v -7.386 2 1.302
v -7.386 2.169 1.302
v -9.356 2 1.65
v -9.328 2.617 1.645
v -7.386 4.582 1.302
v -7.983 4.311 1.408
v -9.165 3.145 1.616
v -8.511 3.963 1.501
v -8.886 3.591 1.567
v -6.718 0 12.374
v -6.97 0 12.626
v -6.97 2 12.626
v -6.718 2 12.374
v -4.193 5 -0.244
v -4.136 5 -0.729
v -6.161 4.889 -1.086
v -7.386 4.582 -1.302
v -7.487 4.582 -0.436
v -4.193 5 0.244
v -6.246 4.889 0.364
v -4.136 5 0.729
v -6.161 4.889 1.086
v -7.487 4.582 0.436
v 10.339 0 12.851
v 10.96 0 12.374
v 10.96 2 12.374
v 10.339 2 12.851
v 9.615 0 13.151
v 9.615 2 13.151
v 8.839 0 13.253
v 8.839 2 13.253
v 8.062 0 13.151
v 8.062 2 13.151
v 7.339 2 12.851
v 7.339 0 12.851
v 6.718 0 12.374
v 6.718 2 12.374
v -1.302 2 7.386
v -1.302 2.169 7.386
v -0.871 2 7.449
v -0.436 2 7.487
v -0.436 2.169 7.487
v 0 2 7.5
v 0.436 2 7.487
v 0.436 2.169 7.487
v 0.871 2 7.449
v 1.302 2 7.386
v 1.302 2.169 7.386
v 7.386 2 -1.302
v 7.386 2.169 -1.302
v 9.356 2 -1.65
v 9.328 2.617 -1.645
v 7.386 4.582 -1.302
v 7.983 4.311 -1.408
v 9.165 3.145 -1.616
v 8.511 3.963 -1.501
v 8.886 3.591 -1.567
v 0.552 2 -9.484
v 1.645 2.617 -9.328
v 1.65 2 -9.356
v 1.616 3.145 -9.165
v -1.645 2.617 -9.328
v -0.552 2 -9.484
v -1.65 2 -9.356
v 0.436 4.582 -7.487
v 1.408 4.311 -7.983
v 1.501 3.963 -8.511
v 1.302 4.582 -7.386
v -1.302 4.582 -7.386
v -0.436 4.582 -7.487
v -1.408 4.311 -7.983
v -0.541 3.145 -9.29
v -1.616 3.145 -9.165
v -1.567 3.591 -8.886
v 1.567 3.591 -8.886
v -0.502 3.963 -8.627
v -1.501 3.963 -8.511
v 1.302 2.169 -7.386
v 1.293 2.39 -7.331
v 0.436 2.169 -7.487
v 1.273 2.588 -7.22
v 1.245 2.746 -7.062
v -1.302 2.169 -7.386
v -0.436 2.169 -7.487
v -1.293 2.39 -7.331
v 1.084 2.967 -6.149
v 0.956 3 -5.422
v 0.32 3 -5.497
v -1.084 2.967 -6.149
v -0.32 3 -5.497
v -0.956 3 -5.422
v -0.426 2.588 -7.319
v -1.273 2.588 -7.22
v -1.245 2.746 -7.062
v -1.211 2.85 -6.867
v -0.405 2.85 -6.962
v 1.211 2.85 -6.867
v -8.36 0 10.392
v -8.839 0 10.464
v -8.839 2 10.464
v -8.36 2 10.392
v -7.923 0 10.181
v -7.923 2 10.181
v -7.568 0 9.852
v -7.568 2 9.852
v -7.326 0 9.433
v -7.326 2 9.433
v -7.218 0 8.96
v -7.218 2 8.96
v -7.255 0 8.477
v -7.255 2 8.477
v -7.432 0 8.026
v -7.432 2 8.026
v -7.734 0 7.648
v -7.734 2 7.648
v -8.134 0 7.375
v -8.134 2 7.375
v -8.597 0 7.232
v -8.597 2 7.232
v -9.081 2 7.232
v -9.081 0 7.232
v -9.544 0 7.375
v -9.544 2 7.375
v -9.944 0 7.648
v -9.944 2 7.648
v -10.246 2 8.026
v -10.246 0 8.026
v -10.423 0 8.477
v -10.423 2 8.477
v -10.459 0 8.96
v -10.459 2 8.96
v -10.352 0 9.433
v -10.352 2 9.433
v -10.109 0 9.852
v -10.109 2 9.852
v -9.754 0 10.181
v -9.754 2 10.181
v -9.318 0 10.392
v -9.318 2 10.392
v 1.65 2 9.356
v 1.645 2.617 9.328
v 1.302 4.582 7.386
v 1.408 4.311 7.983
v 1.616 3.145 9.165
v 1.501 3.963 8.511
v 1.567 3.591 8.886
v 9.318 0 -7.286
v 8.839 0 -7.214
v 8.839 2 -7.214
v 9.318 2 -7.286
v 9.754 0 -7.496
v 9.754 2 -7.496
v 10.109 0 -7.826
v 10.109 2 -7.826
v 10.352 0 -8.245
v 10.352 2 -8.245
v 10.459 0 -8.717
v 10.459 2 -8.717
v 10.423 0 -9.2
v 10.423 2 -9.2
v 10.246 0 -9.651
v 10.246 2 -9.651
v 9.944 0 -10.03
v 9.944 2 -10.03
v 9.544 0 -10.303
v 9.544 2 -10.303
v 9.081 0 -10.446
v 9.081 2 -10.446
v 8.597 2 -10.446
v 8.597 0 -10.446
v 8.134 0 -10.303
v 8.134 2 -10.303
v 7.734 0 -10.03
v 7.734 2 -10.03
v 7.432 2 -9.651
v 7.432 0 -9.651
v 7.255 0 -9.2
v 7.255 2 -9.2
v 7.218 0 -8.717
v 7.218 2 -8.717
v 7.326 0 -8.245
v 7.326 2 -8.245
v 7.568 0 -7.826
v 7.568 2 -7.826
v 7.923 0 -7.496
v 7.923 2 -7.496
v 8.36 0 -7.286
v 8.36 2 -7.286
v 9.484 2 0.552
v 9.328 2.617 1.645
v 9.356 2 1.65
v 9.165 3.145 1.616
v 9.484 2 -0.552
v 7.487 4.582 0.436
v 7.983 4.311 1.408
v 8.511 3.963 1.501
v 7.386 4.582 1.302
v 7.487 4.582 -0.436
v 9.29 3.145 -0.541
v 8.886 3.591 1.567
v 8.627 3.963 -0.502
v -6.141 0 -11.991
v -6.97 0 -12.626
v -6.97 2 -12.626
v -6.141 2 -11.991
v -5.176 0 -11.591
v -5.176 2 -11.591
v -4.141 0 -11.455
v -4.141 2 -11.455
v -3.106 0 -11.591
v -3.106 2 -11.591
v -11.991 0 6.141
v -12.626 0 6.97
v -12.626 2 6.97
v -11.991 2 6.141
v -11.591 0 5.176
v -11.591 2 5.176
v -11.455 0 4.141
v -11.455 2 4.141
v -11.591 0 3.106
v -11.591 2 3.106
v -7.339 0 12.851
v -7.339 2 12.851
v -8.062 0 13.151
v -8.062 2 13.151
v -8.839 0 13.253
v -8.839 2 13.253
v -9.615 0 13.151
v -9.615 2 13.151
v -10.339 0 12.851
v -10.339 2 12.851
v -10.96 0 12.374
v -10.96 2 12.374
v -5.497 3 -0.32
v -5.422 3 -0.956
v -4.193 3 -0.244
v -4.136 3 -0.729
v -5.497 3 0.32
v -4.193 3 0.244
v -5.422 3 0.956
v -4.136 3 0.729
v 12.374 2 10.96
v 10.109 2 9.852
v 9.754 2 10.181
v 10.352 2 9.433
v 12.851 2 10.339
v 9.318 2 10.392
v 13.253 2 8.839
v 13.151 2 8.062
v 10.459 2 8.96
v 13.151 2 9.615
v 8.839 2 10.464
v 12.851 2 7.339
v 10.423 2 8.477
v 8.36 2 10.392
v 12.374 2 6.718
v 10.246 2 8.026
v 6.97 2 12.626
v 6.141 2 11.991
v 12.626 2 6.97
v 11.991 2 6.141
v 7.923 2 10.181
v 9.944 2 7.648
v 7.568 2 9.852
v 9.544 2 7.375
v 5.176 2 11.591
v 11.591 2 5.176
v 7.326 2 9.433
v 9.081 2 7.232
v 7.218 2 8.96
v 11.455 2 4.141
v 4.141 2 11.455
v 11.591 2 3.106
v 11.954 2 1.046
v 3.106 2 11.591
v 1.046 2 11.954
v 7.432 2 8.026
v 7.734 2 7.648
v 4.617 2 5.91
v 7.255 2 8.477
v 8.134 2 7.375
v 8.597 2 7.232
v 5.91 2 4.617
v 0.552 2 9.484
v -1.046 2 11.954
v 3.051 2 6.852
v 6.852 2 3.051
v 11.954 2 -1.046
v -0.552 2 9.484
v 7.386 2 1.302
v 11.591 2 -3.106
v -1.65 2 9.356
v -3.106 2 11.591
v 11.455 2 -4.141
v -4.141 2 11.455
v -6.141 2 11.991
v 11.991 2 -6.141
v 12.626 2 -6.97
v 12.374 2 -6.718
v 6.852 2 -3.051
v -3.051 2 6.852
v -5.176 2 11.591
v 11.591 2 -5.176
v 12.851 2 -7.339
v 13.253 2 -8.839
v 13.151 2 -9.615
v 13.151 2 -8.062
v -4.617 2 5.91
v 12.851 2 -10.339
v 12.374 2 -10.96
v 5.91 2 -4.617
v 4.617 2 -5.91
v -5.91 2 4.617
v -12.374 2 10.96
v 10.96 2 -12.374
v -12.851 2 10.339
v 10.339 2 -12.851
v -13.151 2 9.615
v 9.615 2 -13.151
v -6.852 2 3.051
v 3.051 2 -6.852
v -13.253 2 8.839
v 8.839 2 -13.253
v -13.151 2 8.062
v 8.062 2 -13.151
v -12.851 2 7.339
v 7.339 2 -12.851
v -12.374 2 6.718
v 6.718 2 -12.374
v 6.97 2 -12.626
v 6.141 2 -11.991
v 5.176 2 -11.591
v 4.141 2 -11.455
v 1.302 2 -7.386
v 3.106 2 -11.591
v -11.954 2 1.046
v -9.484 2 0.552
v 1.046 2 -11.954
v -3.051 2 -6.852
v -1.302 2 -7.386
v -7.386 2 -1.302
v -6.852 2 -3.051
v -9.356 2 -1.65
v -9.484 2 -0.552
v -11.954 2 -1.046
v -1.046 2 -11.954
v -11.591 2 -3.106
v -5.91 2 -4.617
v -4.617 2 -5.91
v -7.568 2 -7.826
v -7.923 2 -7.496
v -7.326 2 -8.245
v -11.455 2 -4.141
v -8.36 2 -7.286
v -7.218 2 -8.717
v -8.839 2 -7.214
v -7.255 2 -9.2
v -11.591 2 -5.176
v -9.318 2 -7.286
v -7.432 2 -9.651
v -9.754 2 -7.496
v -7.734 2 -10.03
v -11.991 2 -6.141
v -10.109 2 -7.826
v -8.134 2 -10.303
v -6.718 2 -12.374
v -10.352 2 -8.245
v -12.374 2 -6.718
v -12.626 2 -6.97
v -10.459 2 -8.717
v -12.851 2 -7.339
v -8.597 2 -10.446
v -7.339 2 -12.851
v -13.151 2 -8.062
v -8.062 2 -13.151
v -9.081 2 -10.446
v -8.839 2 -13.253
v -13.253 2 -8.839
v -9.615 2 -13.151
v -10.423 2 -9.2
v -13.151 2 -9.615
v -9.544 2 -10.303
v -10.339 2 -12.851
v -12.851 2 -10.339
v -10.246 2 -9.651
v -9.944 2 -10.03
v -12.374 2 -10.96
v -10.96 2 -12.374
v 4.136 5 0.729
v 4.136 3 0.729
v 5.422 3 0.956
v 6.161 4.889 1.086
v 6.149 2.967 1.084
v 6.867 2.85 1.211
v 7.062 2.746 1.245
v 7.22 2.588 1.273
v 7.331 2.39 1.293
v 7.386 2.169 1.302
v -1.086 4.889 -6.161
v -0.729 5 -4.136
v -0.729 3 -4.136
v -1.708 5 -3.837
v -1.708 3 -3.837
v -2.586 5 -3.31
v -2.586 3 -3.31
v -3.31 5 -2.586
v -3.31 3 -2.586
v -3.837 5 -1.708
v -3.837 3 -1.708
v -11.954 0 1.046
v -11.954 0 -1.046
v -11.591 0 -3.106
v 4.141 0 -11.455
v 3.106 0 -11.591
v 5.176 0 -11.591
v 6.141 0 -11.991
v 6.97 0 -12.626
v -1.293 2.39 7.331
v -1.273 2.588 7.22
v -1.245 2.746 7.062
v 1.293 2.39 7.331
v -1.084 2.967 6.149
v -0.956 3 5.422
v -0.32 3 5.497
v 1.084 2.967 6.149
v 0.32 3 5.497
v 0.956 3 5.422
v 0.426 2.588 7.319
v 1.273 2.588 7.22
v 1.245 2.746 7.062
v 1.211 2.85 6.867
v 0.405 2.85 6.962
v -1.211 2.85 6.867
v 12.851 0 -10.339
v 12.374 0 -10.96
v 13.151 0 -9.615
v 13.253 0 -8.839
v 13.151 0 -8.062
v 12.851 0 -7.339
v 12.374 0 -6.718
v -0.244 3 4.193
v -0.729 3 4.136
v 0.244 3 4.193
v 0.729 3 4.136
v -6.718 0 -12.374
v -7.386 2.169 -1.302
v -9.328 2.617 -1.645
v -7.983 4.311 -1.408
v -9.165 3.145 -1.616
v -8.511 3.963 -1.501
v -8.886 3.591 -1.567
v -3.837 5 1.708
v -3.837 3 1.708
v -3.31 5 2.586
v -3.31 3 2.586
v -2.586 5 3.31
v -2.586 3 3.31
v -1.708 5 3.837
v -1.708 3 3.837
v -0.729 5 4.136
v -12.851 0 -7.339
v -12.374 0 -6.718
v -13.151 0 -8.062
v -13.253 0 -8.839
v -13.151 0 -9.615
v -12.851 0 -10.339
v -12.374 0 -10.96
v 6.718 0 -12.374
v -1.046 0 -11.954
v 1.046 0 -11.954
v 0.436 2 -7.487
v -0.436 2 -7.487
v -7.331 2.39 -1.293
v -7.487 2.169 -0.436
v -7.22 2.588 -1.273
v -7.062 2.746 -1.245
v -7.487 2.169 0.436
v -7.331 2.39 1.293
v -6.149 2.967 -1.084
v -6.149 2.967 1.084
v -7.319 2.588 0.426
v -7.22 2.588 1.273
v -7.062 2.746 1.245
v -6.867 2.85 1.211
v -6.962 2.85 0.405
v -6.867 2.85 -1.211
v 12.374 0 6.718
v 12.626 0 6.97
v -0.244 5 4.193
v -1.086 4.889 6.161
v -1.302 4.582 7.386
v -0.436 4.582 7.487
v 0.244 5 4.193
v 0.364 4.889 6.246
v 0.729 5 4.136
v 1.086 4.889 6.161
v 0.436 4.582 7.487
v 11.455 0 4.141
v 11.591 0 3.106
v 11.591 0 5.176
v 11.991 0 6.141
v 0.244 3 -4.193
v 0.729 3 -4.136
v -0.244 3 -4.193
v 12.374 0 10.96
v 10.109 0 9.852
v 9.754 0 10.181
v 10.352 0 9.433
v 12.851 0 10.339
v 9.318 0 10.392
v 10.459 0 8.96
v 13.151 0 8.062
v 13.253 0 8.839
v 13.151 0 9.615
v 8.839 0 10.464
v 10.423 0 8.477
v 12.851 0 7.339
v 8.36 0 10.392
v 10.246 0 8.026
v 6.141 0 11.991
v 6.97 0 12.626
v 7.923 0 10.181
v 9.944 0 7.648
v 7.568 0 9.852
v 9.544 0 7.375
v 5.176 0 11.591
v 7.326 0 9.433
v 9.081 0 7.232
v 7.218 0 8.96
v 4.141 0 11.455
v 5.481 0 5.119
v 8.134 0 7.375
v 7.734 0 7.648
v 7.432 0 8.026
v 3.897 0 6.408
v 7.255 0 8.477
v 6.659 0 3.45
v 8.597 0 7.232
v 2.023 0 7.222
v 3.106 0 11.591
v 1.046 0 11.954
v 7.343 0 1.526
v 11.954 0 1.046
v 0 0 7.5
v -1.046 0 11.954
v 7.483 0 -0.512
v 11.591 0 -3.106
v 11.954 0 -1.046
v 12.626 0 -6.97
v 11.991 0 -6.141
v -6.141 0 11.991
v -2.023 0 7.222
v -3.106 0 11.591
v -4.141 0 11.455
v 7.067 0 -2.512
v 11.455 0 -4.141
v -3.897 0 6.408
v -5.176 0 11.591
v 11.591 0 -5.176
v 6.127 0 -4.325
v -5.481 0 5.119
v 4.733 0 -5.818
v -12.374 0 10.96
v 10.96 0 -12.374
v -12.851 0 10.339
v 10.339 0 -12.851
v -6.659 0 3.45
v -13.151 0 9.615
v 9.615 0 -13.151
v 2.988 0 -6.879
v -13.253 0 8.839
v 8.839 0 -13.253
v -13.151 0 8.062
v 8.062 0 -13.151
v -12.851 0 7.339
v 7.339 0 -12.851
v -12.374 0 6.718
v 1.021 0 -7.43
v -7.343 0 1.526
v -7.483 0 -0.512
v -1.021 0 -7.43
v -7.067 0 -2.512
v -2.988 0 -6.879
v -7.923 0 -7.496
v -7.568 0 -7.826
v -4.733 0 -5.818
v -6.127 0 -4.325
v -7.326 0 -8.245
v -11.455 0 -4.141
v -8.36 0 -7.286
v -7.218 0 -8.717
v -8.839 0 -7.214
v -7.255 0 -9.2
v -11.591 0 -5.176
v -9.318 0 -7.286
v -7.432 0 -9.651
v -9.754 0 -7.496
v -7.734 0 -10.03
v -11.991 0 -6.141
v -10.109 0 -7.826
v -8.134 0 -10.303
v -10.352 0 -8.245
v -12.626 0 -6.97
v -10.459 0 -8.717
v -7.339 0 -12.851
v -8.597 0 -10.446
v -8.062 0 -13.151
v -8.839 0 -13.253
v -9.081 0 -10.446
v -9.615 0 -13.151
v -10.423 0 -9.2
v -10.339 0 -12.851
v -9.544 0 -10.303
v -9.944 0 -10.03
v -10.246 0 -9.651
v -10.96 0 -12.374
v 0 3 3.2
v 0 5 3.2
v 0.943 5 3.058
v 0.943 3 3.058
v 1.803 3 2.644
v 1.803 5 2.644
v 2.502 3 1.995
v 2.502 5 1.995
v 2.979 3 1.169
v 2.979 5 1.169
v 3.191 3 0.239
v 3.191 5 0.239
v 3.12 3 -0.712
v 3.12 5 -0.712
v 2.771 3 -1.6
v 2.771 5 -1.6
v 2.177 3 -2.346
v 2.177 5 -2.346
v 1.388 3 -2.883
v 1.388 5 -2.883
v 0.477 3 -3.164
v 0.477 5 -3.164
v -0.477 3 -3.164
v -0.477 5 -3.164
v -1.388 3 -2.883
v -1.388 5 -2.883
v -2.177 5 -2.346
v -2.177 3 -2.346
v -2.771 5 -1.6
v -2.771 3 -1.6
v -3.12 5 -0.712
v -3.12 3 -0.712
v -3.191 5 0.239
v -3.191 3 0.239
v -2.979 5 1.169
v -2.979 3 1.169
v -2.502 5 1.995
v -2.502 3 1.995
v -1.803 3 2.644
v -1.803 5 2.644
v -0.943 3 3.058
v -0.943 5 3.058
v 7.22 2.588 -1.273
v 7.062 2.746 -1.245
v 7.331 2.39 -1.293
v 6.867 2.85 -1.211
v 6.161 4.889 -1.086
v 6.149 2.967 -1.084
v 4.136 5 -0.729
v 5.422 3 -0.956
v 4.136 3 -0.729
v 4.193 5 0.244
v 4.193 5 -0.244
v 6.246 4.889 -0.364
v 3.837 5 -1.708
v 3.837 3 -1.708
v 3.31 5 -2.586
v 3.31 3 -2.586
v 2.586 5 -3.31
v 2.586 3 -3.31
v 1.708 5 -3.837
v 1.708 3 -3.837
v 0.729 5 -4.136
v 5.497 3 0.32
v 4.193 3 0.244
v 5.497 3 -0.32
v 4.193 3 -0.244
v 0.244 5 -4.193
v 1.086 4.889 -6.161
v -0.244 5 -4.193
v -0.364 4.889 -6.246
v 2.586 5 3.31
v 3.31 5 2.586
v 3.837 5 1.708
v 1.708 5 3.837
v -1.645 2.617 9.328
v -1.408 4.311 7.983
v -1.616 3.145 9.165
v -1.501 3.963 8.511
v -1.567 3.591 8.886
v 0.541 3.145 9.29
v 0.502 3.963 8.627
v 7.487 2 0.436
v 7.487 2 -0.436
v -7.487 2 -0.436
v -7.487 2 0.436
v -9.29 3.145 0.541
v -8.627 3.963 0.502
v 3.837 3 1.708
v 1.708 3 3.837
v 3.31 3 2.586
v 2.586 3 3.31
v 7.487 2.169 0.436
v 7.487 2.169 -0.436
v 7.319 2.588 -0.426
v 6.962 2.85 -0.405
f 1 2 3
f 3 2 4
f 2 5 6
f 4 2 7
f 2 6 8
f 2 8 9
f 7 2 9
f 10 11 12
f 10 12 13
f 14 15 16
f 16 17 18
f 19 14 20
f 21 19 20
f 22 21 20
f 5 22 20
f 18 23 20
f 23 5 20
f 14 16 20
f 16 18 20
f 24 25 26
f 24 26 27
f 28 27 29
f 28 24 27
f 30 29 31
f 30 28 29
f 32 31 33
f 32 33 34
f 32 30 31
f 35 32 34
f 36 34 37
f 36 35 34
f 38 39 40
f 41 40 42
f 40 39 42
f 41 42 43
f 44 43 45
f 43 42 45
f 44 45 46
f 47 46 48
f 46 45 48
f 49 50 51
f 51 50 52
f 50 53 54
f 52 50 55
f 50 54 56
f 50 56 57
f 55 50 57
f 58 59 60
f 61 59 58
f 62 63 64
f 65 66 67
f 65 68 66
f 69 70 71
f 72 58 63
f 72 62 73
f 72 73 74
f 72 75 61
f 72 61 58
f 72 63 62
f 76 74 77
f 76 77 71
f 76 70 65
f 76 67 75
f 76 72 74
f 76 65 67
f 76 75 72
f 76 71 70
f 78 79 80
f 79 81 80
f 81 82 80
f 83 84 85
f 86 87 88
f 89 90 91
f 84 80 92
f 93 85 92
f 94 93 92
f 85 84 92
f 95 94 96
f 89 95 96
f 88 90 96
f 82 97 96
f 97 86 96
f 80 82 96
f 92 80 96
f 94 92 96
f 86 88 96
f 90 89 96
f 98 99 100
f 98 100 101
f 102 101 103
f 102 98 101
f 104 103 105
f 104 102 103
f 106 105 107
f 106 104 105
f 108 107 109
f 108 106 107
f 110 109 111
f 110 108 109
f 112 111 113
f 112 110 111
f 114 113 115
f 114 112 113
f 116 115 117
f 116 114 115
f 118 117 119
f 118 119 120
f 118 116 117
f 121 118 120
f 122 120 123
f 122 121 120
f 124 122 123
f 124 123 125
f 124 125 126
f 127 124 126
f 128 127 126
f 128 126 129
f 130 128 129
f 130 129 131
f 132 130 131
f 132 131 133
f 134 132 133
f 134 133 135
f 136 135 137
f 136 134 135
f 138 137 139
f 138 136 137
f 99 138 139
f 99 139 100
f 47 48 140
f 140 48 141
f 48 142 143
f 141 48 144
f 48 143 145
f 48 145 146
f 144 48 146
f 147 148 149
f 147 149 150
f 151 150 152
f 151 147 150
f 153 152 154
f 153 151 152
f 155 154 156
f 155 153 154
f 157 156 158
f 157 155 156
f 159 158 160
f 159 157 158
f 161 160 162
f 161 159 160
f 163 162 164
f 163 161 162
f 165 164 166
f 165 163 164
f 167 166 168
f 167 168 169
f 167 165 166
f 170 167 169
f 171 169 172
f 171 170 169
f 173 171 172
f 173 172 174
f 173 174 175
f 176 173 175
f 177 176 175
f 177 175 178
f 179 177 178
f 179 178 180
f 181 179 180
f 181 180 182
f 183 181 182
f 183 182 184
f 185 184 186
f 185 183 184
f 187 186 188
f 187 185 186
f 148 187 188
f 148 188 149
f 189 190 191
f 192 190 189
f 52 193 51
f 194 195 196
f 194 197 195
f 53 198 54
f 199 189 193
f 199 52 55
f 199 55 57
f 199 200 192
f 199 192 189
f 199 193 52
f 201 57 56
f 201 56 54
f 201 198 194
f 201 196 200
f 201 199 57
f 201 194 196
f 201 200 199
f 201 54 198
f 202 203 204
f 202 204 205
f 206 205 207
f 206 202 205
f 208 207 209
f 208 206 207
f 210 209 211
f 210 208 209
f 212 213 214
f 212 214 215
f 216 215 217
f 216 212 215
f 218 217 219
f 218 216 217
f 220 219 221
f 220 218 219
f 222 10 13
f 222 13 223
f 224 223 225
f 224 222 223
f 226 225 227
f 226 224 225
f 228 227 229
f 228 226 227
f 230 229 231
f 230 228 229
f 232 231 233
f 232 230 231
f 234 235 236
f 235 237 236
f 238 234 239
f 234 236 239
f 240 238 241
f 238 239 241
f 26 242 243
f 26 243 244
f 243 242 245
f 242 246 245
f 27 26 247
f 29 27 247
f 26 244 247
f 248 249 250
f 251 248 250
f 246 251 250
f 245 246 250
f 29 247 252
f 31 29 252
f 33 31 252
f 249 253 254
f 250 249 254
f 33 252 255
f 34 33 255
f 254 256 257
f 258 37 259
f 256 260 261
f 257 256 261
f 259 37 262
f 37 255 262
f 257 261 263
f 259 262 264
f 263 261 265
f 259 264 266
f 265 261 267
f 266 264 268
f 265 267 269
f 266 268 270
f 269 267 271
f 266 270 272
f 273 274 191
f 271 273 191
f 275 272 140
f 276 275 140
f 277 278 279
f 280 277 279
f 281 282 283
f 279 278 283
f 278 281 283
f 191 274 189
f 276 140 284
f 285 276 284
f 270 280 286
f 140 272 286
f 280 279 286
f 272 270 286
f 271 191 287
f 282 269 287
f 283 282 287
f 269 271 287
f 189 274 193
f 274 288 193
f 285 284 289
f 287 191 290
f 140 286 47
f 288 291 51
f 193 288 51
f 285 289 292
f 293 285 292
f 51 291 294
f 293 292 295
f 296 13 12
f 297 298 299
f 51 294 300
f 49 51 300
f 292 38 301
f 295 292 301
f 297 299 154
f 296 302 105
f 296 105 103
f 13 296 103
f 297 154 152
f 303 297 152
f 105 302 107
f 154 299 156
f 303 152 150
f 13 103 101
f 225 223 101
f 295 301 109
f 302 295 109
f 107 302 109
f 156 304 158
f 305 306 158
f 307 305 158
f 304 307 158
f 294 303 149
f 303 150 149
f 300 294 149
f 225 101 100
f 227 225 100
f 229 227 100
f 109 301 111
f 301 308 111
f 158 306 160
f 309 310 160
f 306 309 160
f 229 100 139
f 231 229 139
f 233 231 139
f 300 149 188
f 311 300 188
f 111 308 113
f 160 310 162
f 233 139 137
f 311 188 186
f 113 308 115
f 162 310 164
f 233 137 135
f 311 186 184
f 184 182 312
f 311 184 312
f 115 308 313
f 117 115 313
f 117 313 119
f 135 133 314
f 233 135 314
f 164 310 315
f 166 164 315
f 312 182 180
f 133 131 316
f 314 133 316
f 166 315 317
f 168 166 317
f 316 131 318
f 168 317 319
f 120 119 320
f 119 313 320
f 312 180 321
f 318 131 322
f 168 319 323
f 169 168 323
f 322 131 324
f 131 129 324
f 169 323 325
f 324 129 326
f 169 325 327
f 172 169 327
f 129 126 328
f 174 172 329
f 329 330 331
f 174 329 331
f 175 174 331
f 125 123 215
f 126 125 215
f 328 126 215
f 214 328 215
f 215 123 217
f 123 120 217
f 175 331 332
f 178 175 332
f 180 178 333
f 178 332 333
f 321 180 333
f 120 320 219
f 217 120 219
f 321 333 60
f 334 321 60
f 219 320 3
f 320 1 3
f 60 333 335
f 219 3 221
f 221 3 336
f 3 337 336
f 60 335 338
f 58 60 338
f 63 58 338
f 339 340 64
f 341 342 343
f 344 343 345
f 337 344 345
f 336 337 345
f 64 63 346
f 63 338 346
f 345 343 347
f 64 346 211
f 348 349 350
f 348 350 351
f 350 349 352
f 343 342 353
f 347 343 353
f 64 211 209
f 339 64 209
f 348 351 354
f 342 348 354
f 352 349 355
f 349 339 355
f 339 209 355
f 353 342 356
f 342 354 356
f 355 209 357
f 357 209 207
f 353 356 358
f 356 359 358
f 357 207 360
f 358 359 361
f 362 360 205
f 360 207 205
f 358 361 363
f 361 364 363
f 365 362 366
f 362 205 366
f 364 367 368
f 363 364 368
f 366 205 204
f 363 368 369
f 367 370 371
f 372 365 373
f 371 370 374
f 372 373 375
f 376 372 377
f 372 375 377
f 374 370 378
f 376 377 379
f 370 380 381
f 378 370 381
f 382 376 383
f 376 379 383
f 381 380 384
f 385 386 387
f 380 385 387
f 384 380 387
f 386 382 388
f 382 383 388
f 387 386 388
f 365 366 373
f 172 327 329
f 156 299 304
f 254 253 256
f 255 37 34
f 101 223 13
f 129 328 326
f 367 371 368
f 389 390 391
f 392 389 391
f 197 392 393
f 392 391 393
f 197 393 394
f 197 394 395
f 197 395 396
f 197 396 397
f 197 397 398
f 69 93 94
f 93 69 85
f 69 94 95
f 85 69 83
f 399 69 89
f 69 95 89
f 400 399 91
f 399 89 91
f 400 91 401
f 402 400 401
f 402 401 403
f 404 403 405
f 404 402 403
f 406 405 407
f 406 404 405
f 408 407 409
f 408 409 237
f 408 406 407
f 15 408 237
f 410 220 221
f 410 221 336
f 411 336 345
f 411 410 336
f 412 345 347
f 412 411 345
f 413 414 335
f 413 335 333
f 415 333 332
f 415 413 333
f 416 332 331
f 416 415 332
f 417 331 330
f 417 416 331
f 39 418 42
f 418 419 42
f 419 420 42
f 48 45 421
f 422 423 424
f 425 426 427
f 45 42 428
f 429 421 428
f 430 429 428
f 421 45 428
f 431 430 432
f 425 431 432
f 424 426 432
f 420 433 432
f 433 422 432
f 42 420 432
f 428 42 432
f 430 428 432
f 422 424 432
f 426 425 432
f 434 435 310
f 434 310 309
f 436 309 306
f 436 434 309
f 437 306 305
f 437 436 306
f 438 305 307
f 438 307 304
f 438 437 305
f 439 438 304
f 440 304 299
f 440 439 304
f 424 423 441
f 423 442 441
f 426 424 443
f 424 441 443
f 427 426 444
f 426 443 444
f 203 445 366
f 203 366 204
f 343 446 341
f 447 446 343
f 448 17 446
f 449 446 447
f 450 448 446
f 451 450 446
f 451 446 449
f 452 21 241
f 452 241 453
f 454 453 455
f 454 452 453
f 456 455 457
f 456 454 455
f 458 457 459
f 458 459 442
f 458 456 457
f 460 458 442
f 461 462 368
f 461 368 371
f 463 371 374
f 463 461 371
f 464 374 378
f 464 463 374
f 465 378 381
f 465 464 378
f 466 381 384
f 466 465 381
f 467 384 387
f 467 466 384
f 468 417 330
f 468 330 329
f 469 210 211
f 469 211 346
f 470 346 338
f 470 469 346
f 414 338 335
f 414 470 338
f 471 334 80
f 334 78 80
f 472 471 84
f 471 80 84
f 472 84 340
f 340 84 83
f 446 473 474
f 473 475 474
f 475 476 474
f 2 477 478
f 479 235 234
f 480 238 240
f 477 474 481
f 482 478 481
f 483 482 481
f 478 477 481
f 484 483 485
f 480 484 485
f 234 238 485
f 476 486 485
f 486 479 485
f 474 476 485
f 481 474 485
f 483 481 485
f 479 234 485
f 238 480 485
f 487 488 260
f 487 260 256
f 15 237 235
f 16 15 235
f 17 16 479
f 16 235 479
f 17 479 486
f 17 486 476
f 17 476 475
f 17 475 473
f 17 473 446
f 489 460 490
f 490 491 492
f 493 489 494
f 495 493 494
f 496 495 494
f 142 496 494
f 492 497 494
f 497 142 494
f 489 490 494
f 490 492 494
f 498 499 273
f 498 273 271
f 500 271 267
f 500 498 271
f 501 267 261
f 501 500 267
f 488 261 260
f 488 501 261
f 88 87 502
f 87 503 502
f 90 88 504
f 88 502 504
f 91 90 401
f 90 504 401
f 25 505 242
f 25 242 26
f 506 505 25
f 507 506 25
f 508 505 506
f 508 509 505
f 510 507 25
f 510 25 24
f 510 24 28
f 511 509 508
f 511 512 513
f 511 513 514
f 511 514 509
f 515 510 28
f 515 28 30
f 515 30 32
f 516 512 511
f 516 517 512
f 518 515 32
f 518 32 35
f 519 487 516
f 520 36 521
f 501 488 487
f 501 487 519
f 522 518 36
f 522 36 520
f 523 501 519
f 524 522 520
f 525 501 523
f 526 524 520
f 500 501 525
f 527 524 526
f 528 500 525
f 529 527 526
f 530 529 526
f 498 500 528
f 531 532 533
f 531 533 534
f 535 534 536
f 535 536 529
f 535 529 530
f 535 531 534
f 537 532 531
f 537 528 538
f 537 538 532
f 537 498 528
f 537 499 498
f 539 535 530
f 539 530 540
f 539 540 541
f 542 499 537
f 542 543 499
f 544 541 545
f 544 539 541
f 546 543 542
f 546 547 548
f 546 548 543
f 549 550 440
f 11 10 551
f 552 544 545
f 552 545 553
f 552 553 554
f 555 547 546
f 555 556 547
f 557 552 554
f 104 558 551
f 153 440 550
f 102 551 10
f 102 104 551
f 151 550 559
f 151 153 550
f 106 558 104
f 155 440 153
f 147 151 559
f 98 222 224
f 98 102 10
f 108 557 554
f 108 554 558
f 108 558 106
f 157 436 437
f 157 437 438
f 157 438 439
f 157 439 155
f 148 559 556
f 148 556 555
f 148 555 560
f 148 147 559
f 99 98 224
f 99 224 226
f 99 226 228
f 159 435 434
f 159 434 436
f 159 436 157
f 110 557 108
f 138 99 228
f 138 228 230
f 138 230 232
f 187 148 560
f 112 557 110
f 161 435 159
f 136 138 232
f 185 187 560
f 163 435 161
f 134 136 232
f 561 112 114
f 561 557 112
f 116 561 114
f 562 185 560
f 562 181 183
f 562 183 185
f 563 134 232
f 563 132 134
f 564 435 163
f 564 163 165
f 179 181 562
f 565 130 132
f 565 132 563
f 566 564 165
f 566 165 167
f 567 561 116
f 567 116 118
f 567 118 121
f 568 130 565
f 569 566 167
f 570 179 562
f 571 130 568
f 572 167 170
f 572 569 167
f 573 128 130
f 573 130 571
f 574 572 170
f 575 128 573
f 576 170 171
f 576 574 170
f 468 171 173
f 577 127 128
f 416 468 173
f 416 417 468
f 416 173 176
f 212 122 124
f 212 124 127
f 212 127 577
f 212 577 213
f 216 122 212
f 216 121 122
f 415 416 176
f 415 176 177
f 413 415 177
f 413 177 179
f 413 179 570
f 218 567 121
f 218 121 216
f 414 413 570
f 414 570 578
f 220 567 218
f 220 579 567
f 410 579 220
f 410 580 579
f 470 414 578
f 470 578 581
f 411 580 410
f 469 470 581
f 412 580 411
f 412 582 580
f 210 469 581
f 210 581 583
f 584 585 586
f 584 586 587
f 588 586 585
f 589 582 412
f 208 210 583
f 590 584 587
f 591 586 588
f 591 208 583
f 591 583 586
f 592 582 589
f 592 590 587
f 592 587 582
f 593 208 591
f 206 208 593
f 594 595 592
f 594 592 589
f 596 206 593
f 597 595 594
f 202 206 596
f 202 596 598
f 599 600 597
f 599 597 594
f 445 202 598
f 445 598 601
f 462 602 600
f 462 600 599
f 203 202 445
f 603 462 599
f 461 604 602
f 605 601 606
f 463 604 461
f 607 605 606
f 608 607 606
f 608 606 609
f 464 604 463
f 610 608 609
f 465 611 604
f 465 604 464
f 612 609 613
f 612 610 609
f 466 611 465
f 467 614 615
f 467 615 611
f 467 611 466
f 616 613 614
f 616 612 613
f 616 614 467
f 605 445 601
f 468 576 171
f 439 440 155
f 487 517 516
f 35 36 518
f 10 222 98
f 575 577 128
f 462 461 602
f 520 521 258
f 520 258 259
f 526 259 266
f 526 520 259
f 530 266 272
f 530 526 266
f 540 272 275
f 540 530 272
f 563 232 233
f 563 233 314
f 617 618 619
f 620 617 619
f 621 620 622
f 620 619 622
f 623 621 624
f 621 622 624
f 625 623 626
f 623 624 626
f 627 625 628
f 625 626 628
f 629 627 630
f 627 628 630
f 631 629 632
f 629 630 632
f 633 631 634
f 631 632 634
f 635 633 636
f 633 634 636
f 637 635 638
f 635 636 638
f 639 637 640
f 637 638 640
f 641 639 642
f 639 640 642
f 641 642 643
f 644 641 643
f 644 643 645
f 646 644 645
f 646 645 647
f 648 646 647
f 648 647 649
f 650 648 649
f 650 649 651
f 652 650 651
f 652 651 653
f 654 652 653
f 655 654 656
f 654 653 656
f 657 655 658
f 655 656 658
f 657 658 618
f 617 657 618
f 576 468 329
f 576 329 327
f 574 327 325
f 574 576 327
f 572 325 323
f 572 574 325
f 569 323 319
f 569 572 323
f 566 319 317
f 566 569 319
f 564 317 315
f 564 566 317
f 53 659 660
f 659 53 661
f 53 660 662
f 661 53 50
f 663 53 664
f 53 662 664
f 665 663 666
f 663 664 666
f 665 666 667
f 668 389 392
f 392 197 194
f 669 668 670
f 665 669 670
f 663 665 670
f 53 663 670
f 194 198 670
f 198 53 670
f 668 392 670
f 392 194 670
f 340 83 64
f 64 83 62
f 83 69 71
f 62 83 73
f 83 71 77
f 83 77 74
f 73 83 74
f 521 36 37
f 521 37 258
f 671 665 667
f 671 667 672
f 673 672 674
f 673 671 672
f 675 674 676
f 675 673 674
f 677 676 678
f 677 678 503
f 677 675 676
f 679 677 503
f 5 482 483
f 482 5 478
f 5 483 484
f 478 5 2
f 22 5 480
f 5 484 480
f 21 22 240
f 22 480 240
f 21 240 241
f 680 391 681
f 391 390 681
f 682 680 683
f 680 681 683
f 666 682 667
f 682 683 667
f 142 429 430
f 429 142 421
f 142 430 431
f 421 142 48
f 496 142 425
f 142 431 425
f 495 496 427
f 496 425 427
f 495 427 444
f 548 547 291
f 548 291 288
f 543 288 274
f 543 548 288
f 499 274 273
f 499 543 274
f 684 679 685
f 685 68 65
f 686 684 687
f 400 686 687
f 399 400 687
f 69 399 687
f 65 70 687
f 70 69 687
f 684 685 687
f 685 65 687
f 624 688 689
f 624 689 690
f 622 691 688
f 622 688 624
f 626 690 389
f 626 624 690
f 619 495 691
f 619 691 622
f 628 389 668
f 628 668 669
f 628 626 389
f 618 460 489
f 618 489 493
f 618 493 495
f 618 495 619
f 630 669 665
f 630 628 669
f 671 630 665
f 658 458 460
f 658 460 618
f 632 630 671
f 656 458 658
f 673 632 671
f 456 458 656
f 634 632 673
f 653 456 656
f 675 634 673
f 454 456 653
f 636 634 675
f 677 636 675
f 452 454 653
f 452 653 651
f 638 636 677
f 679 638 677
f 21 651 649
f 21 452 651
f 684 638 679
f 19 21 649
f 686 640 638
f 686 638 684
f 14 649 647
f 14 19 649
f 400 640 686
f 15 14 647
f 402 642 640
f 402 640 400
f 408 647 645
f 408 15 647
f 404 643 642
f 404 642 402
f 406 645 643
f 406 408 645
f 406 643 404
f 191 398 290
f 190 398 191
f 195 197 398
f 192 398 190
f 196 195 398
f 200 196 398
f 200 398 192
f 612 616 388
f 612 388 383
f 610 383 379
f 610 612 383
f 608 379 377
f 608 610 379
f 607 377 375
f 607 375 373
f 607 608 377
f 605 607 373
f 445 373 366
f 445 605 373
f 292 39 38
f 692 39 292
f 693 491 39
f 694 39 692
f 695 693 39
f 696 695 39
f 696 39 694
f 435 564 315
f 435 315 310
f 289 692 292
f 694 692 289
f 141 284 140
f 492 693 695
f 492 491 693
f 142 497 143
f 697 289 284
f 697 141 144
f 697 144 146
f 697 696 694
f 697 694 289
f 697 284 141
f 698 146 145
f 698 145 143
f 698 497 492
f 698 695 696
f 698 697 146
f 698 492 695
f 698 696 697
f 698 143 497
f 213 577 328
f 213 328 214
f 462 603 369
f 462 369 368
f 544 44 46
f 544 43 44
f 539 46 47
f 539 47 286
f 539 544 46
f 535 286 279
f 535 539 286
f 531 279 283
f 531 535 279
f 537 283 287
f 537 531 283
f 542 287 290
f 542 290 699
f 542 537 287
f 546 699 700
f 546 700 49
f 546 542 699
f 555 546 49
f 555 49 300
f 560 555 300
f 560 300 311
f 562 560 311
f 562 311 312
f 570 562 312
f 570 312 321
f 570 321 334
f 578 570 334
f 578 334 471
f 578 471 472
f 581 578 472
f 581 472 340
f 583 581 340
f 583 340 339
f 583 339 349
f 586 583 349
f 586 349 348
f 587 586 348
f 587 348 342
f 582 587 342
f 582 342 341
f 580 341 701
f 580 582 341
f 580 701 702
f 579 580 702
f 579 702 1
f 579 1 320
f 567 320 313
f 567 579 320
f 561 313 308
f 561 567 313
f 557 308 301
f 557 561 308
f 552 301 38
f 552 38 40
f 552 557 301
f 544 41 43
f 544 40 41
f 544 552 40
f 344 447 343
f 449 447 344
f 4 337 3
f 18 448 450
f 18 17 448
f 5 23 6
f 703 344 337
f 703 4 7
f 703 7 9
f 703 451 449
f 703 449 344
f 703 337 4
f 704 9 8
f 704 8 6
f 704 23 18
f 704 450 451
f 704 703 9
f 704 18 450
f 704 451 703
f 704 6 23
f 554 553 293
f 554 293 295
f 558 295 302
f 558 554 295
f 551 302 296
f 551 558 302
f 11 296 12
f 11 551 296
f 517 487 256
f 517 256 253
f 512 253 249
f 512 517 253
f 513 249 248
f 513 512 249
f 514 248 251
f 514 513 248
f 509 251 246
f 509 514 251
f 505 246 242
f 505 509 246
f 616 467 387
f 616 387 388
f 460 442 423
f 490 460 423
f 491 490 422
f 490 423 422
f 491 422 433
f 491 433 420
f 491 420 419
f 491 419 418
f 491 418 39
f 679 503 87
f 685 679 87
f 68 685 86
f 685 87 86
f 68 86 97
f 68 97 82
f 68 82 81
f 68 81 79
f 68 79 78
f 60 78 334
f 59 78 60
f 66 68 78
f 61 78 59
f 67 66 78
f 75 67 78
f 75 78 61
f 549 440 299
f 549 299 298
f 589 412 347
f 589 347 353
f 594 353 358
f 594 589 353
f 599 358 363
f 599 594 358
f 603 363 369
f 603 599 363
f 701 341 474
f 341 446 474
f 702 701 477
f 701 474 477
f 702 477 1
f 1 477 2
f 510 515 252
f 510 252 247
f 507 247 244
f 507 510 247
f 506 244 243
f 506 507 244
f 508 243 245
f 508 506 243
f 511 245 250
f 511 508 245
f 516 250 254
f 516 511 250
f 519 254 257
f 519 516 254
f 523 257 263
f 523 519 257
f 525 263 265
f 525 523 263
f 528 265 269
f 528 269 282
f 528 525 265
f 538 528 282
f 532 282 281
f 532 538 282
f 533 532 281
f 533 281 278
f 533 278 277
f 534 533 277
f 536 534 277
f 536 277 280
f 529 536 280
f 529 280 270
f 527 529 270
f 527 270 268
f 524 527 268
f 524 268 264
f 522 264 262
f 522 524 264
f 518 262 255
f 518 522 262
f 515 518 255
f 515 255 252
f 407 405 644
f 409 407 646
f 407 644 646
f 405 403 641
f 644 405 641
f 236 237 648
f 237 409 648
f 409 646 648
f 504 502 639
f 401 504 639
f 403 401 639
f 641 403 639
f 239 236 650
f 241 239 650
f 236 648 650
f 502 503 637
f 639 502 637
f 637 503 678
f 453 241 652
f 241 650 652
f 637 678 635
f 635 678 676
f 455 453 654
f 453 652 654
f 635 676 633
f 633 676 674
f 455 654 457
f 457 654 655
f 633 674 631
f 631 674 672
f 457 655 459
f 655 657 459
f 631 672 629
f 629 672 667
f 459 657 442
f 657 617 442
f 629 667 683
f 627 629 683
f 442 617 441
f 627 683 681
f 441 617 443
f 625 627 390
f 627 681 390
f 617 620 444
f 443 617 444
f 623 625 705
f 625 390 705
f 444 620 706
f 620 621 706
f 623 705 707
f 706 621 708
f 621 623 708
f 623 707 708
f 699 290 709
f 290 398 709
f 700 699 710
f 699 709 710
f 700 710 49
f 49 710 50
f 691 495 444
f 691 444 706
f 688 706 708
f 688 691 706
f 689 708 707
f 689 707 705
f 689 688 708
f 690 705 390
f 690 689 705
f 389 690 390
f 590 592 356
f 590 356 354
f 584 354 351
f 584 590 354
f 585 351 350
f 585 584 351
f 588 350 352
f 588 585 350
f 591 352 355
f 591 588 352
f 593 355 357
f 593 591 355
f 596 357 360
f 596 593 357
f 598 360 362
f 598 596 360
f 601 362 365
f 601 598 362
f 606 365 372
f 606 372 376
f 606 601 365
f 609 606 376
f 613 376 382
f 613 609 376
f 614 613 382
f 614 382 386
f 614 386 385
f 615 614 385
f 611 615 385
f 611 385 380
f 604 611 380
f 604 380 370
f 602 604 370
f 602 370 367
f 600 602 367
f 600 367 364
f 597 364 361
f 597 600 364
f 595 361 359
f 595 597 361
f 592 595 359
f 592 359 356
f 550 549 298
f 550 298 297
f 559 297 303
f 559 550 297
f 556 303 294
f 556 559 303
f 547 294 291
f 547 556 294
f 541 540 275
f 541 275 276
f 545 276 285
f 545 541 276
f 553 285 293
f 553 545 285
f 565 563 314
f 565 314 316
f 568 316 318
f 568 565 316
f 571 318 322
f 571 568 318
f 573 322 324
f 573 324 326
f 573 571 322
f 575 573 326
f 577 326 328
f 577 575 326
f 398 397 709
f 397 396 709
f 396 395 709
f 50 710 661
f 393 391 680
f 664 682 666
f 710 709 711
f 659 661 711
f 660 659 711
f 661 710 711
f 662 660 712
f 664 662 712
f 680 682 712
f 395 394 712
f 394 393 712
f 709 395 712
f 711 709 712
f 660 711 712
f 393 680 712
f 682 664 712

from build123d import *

# Parameters (mm, degrees)
SKETCH21_R          = 1.625
SKETCH21_R_2        = 7.5
MAIN_DEPTH          = 2
SKETCH23_R          = 4.2
SKETCH23_R_2        = 3.2
BOSS_EXTRUDE1_DEPTH = 2
REVOLVE1_START      = 2
REVOLVE1_DEPTH      = 3.0000001
REVOLVE1_2_ANGLE    = 20
REVOLVE1_3_ANGLE    = 20
CIRPATTERN1_COUNT   = 4


with BuildPart() as part:
    # Sketch21 → Main (new body)
    with BuildSketch(Plane(origin=(0, 0, 0), x_dir=(1, 0, 0), z_dir=(0, 1, 0))):
        with BuildLine():
            Line((-12.374368671, 10.960155108), (-10.960155108, 12.374368671))
            ThreePointArc((-10.960155108, 12.374368671), (-8.838834765, 13.253048327), (-6.717514421, 12.374368671))
            Line((-6.717514421, 12.374368671), (-6.969531846, 12.626386096))
            ThreePointArc((-6.969531846, 12.626386096), (-5.176380902, 11.591109915), (-3.105828541, 11.591109915))
            ThreePointArc((-3.105828541, 11.591109915), (0, 12), (3.105828541, 11.591109915))
            ThreePointArc((3.105828541, 11.591109915), (5.176380902, 11.591109915), (6.969531846, 12.626386096))
            Line((6.969531846, 12.626386096), (6.717514421, 12.374368671))
            ThreePointArc((6.717514421, 12.374368671), (8.838834765, 13.253048327), (10.960155108, 12.374368671))
            Line((10.960155108, 12.374368671), (12.374368671, 10.960155108))
            ThreePointArc((12.374368671, 10.960155108), (13.253048327, 8.838834765), (12.374368671, 6.717514421))
            Line((12.374368671, 6.717514421), (12.626386096, 6.969531846))
            ThreePointArc((12.626386096, 6.969531846), (11.591109915, 5.176380902), (11.591109915, 3.105828541))
            ThreePointArc((11.591109915, 3.105828541), (12, 0), (11.591109915, -3.105828541))
            ThreePointArc((11.591109915, -3.105828541), (11.591109915, -5.176380902), (12.626386096, -6.969531846))
            Line((12.626386096, -6.969531846), (12.374368671, -6.717514421))
            ThreePointArc((12.374368671, -6.717514421), (13.253048327, -8.838834765), (12.374368671, -10.960155108))
            Line((12.374368671, -10.960155108), (10.960155108, -12.374368671))
            ThreePointArc((10.960155108, -12.374368671), (8.838834765, -13.253048327), (6.717514421, -12.374368671))
            Line((6.717514421, -12.374368671), (6.969531846, -12.626386096))
            ThreePointArc((6.969531846, -12.626386096), (5.176380902, -11.591109915), (3.105828541, -11.591109915))
            ThreePointArc((3.105828541, -11.591109915), (0, -12), (-3.105828541, -11.591109915))
            ThreePointArc((-3.105828541, -11.591109915), (-5.176380902, -11.591109915), (-6.969531846, -12.626386096))
            Line((-6.969531846, -12.626386096), (-6.717514421, -12.374368671))
            ThreePointArc((-6.717514421, -12.374368671), (-8.838834765, -13.253048327), (-10.960155108, -12.374368671))
            Line((-10.960155108, -12.374368671), (-12.374368671, -10.960155108))
            ThreePointArc((-12.374368671, -10.960155108), (-13.253048327, -8.838834765), (-12.374368671, -6.717514421))
            Line((-12.374368671, -6.717514421), (-12.626386096, -6.969531846))
            ThreePointArc((-12.626386096, -6.969531846), (-11.591109915, -5.176380902), (-11.591109915, -3.105828541))
            ThreePointArc((-11.591109915, -3.105828541), (-12, 0), (-11.591109915, 3.105828541))
            ThreePointArc((-11.591109915, 3.105828541), (-11.591109915, 5.176380902), (-12.626386096, 6.969531846))
            Line((-12.626386096, 6.969531846), (-12.374368671, 6.717514421))
            ThreePointArc((-12.374368671, 6.717514421), (-13.253048327, 8.838834765), (-12.374368671, 10.960155108))
        make_face()
        with Locations(Location((8.838834765, 8.838834765, 0), (0, 0, 270))):
            Circle(SKETCH21_R, mode=Mode.SUBTRACT)
        with Locations(Location((8.838834765, -8.838834765, 0), (0, 0, 270))):
            Circle(SKETCH21_R, mode=Mode.SUBTRACT)
        with Locations(Location((-8.838834765, -8.838834765, 0), (0, 0, 270))):
            Circle(SKETCH21_R, mode=Mode.SUBTRACT)
        with Locations(Location((-8.838834765, 8.838834765, 0), (0, 0, 270))):
            Circle(SKETCH21_R, mode=Mode.SUBTRACT)
        with Locations(Location((0, 0, 0), (0, 0, 270))):
            Circle(SKETCH21_R_2, mode=Mode.SUBTRACT)
    extrude(amount=MAIN_DEPTH)



with BuildPart() as body_2:
    # Sketch23 → Boss-Extrude1 (new body)
    with BuildSketch(Plane(origin=(0, 5, 0), x_dir=(1, 0, 0), z_dir=(0, 1, 0))):
        with Locations(Location((0, 0, 0), (0, 0, 270))):
            Circle(SKETCH23_R)
        with Locations(Location((0, 0, 0), (0, 0, 270))):
            Circle(SKETCH23_R_2, mode=Mode.SUBTRACT)
    extrude(amount=-BOSS_EXTRUDE1_DEPTH)


with BuildPart() as part_1:
    add(part.part)

    add(body_2.part)  # Revolve1 merges body 2
    # Revolve1: read off the stored shape, not the designer's step
    # Revolve1 outline → Revolve1 (add)
    with BuildSketch(Plane(origin=(0, 0, 0), x_dir=(1, 0, 0), z_dir=(0, 1, 0)).offset(REVOLVE1_START)):
        with BuildLine():
            ThreePointArc((-7.386058148, 1.302361332), (-7.5, 0), (-7.386058148, -1.302361332))
            Line((-7.386058148, -1.302361332), (-4.136192563, -0.729322346))
            ThreePointArc((-4.136192563, -0.729322346), (-4.2, 0), (-4.136192563, 0.729322346))
            Line((-4.136192563, 0.729322346), (-7.386058148, 1.302361332))
        make_face()
    revolve1 = extrude(amount=REVOLVE1_DEPTH)

    # Revolve1 2 outline → Revolve1 2 (revolve, cut)
    with BuildSketch(Plane(origin=(0, 0, 0), x_dir=(-0.9848077530122078, 0, -0.17364817766693202), z_dir=(0.17364817766693202, 0, -0.9848077530122078))):
        with BuildLine():
            Line((7.5, 5.0000001), (4.2, 5))
            add(Edge.make_bspline(
                [(4.2, 5), (5.982635205, 4.992310164), (6.774082879, 4.851938269), (7.492555324, 4.584836693), (7.5, 4.582052306)],
                knots=[0, 0, 0, 0, 0.380988924, 0.384982373, 0.384982373, 0.384982373, 0.384982373], degree=3))
            Line((7.5, 4.582052306), (7.5, 5.0000001))
        make_face()
        with BuildLine():
            Line((5.505892852, 3), (4.2, 3))
            Line((4.2, 3), (4.2, 2))
            Line((4.2, 2), (7.5, 2))
            Line((7.5, 2), (7.5, 2.168694052))
            add(Edge.make_bspline(
                [(7.5, 2.168694052), (7.474165676, 2.402361508), (7.259227976, 2.776784864), (6.698722273, 2.938737477), (6.279860406, 2.965955752), (5.872473083, 2.987273734), (5.643353064, 2.995990887), (5.505892852, 3)],
                knots=[0.04346167, 0.04346167, 0.04346167, 0.04346167, 0.224146676, 0.342653564, 0.481775745, 0.553286067, 0.660507352, 0.660507352, 0.660507352, 0.660507352], degree=3))
        make_face()
        with BuildLine():
            add(Edge.make_bspline(
                [(5.505892852, 3), (5.070655283, 3.012693977), (4.635308795, 3.013153878), (4.2, 3)],
                knots=[0.660507352, 0.660507352, 0.660507352, 0.660507352, 1, 1, 1, 1], degree=3))
            Line((4.2, 3), (5.505892852, 3))
        make_face()
    revolve1_2 = revolve(axis=Axis((0, 0, 0), (0, 1, 0)), revolution_arc=REVOLVE1_2_ANGLE, mode=Mode.SUBTRACT)

    # Revolve1 3 outline → Revolve1 3 (revolve)
    with BuildSketch(Plane(origin=(0, 0, 0), x_dir=(-0.9848077530122078, 0, -0.17364817766693202), z_dir=(0.17364817766693202, 0, -0.9848077530122078))):
        with BuildLine():
            Line((7.5, 4.582052306), (7.5, 2.168694052))
            add(Edge.make_bspline(
                [(7.5, 2), (7.506412796, 2.055845291), (7.506214145, 2.112488071), (7.5, 2.168694052)],
                knots=[0, 0, 0, 0, 0.04346167, 0.04346167, 0.04346167, 0.04346167], degree=3))
            Line((7.5, 2), (9.5, 2))
            add(Edge.make_bspline(
                [(9.5, 2), (9.601210283, 3.398928444), (8.64652948, 4.15323827), (7.5, 4.582052306)],
                knots=[0.969922529, 0.969922529, 0.969922529, 0.969922529, 1.584940156, 1.584940156, 1.584940156, 1.584940156], degree=3))
        make_face()
    revolve1_3 = revolve(axis=Axis((0, 0, 0), (0, 1, 0)), revolution_arc=REVOLVE1_3_ANGLE)

    # CirPattern1: Revolve1, Revolve1 2, Revolve1 3 ×4 about axis
    cirpattern1_axis = Axis((0, -52.54930657, 0), (0, 1, 0))
    add([revolve1.rotate(cirpattern1_axis, i * 360 / CIRPATTERN1_COUNT) for i in range(1, CIRPATTERN1_COUNT)])
    add([revolve1_2.rotate(cirpattern1_axis, i * 360 / CIRPATTERN1_COUNT) for i in range(1, CIRPATTERN1_COUNT)], mode=Mode.SUBTRACT)
    add([revolve1_3.rotate(cirpattern1_axis, i * 360 / CIRPATTERN1_COUNT) for i in range(1, CIRPATTERN1_COUNT)])


solid = part_1.part
